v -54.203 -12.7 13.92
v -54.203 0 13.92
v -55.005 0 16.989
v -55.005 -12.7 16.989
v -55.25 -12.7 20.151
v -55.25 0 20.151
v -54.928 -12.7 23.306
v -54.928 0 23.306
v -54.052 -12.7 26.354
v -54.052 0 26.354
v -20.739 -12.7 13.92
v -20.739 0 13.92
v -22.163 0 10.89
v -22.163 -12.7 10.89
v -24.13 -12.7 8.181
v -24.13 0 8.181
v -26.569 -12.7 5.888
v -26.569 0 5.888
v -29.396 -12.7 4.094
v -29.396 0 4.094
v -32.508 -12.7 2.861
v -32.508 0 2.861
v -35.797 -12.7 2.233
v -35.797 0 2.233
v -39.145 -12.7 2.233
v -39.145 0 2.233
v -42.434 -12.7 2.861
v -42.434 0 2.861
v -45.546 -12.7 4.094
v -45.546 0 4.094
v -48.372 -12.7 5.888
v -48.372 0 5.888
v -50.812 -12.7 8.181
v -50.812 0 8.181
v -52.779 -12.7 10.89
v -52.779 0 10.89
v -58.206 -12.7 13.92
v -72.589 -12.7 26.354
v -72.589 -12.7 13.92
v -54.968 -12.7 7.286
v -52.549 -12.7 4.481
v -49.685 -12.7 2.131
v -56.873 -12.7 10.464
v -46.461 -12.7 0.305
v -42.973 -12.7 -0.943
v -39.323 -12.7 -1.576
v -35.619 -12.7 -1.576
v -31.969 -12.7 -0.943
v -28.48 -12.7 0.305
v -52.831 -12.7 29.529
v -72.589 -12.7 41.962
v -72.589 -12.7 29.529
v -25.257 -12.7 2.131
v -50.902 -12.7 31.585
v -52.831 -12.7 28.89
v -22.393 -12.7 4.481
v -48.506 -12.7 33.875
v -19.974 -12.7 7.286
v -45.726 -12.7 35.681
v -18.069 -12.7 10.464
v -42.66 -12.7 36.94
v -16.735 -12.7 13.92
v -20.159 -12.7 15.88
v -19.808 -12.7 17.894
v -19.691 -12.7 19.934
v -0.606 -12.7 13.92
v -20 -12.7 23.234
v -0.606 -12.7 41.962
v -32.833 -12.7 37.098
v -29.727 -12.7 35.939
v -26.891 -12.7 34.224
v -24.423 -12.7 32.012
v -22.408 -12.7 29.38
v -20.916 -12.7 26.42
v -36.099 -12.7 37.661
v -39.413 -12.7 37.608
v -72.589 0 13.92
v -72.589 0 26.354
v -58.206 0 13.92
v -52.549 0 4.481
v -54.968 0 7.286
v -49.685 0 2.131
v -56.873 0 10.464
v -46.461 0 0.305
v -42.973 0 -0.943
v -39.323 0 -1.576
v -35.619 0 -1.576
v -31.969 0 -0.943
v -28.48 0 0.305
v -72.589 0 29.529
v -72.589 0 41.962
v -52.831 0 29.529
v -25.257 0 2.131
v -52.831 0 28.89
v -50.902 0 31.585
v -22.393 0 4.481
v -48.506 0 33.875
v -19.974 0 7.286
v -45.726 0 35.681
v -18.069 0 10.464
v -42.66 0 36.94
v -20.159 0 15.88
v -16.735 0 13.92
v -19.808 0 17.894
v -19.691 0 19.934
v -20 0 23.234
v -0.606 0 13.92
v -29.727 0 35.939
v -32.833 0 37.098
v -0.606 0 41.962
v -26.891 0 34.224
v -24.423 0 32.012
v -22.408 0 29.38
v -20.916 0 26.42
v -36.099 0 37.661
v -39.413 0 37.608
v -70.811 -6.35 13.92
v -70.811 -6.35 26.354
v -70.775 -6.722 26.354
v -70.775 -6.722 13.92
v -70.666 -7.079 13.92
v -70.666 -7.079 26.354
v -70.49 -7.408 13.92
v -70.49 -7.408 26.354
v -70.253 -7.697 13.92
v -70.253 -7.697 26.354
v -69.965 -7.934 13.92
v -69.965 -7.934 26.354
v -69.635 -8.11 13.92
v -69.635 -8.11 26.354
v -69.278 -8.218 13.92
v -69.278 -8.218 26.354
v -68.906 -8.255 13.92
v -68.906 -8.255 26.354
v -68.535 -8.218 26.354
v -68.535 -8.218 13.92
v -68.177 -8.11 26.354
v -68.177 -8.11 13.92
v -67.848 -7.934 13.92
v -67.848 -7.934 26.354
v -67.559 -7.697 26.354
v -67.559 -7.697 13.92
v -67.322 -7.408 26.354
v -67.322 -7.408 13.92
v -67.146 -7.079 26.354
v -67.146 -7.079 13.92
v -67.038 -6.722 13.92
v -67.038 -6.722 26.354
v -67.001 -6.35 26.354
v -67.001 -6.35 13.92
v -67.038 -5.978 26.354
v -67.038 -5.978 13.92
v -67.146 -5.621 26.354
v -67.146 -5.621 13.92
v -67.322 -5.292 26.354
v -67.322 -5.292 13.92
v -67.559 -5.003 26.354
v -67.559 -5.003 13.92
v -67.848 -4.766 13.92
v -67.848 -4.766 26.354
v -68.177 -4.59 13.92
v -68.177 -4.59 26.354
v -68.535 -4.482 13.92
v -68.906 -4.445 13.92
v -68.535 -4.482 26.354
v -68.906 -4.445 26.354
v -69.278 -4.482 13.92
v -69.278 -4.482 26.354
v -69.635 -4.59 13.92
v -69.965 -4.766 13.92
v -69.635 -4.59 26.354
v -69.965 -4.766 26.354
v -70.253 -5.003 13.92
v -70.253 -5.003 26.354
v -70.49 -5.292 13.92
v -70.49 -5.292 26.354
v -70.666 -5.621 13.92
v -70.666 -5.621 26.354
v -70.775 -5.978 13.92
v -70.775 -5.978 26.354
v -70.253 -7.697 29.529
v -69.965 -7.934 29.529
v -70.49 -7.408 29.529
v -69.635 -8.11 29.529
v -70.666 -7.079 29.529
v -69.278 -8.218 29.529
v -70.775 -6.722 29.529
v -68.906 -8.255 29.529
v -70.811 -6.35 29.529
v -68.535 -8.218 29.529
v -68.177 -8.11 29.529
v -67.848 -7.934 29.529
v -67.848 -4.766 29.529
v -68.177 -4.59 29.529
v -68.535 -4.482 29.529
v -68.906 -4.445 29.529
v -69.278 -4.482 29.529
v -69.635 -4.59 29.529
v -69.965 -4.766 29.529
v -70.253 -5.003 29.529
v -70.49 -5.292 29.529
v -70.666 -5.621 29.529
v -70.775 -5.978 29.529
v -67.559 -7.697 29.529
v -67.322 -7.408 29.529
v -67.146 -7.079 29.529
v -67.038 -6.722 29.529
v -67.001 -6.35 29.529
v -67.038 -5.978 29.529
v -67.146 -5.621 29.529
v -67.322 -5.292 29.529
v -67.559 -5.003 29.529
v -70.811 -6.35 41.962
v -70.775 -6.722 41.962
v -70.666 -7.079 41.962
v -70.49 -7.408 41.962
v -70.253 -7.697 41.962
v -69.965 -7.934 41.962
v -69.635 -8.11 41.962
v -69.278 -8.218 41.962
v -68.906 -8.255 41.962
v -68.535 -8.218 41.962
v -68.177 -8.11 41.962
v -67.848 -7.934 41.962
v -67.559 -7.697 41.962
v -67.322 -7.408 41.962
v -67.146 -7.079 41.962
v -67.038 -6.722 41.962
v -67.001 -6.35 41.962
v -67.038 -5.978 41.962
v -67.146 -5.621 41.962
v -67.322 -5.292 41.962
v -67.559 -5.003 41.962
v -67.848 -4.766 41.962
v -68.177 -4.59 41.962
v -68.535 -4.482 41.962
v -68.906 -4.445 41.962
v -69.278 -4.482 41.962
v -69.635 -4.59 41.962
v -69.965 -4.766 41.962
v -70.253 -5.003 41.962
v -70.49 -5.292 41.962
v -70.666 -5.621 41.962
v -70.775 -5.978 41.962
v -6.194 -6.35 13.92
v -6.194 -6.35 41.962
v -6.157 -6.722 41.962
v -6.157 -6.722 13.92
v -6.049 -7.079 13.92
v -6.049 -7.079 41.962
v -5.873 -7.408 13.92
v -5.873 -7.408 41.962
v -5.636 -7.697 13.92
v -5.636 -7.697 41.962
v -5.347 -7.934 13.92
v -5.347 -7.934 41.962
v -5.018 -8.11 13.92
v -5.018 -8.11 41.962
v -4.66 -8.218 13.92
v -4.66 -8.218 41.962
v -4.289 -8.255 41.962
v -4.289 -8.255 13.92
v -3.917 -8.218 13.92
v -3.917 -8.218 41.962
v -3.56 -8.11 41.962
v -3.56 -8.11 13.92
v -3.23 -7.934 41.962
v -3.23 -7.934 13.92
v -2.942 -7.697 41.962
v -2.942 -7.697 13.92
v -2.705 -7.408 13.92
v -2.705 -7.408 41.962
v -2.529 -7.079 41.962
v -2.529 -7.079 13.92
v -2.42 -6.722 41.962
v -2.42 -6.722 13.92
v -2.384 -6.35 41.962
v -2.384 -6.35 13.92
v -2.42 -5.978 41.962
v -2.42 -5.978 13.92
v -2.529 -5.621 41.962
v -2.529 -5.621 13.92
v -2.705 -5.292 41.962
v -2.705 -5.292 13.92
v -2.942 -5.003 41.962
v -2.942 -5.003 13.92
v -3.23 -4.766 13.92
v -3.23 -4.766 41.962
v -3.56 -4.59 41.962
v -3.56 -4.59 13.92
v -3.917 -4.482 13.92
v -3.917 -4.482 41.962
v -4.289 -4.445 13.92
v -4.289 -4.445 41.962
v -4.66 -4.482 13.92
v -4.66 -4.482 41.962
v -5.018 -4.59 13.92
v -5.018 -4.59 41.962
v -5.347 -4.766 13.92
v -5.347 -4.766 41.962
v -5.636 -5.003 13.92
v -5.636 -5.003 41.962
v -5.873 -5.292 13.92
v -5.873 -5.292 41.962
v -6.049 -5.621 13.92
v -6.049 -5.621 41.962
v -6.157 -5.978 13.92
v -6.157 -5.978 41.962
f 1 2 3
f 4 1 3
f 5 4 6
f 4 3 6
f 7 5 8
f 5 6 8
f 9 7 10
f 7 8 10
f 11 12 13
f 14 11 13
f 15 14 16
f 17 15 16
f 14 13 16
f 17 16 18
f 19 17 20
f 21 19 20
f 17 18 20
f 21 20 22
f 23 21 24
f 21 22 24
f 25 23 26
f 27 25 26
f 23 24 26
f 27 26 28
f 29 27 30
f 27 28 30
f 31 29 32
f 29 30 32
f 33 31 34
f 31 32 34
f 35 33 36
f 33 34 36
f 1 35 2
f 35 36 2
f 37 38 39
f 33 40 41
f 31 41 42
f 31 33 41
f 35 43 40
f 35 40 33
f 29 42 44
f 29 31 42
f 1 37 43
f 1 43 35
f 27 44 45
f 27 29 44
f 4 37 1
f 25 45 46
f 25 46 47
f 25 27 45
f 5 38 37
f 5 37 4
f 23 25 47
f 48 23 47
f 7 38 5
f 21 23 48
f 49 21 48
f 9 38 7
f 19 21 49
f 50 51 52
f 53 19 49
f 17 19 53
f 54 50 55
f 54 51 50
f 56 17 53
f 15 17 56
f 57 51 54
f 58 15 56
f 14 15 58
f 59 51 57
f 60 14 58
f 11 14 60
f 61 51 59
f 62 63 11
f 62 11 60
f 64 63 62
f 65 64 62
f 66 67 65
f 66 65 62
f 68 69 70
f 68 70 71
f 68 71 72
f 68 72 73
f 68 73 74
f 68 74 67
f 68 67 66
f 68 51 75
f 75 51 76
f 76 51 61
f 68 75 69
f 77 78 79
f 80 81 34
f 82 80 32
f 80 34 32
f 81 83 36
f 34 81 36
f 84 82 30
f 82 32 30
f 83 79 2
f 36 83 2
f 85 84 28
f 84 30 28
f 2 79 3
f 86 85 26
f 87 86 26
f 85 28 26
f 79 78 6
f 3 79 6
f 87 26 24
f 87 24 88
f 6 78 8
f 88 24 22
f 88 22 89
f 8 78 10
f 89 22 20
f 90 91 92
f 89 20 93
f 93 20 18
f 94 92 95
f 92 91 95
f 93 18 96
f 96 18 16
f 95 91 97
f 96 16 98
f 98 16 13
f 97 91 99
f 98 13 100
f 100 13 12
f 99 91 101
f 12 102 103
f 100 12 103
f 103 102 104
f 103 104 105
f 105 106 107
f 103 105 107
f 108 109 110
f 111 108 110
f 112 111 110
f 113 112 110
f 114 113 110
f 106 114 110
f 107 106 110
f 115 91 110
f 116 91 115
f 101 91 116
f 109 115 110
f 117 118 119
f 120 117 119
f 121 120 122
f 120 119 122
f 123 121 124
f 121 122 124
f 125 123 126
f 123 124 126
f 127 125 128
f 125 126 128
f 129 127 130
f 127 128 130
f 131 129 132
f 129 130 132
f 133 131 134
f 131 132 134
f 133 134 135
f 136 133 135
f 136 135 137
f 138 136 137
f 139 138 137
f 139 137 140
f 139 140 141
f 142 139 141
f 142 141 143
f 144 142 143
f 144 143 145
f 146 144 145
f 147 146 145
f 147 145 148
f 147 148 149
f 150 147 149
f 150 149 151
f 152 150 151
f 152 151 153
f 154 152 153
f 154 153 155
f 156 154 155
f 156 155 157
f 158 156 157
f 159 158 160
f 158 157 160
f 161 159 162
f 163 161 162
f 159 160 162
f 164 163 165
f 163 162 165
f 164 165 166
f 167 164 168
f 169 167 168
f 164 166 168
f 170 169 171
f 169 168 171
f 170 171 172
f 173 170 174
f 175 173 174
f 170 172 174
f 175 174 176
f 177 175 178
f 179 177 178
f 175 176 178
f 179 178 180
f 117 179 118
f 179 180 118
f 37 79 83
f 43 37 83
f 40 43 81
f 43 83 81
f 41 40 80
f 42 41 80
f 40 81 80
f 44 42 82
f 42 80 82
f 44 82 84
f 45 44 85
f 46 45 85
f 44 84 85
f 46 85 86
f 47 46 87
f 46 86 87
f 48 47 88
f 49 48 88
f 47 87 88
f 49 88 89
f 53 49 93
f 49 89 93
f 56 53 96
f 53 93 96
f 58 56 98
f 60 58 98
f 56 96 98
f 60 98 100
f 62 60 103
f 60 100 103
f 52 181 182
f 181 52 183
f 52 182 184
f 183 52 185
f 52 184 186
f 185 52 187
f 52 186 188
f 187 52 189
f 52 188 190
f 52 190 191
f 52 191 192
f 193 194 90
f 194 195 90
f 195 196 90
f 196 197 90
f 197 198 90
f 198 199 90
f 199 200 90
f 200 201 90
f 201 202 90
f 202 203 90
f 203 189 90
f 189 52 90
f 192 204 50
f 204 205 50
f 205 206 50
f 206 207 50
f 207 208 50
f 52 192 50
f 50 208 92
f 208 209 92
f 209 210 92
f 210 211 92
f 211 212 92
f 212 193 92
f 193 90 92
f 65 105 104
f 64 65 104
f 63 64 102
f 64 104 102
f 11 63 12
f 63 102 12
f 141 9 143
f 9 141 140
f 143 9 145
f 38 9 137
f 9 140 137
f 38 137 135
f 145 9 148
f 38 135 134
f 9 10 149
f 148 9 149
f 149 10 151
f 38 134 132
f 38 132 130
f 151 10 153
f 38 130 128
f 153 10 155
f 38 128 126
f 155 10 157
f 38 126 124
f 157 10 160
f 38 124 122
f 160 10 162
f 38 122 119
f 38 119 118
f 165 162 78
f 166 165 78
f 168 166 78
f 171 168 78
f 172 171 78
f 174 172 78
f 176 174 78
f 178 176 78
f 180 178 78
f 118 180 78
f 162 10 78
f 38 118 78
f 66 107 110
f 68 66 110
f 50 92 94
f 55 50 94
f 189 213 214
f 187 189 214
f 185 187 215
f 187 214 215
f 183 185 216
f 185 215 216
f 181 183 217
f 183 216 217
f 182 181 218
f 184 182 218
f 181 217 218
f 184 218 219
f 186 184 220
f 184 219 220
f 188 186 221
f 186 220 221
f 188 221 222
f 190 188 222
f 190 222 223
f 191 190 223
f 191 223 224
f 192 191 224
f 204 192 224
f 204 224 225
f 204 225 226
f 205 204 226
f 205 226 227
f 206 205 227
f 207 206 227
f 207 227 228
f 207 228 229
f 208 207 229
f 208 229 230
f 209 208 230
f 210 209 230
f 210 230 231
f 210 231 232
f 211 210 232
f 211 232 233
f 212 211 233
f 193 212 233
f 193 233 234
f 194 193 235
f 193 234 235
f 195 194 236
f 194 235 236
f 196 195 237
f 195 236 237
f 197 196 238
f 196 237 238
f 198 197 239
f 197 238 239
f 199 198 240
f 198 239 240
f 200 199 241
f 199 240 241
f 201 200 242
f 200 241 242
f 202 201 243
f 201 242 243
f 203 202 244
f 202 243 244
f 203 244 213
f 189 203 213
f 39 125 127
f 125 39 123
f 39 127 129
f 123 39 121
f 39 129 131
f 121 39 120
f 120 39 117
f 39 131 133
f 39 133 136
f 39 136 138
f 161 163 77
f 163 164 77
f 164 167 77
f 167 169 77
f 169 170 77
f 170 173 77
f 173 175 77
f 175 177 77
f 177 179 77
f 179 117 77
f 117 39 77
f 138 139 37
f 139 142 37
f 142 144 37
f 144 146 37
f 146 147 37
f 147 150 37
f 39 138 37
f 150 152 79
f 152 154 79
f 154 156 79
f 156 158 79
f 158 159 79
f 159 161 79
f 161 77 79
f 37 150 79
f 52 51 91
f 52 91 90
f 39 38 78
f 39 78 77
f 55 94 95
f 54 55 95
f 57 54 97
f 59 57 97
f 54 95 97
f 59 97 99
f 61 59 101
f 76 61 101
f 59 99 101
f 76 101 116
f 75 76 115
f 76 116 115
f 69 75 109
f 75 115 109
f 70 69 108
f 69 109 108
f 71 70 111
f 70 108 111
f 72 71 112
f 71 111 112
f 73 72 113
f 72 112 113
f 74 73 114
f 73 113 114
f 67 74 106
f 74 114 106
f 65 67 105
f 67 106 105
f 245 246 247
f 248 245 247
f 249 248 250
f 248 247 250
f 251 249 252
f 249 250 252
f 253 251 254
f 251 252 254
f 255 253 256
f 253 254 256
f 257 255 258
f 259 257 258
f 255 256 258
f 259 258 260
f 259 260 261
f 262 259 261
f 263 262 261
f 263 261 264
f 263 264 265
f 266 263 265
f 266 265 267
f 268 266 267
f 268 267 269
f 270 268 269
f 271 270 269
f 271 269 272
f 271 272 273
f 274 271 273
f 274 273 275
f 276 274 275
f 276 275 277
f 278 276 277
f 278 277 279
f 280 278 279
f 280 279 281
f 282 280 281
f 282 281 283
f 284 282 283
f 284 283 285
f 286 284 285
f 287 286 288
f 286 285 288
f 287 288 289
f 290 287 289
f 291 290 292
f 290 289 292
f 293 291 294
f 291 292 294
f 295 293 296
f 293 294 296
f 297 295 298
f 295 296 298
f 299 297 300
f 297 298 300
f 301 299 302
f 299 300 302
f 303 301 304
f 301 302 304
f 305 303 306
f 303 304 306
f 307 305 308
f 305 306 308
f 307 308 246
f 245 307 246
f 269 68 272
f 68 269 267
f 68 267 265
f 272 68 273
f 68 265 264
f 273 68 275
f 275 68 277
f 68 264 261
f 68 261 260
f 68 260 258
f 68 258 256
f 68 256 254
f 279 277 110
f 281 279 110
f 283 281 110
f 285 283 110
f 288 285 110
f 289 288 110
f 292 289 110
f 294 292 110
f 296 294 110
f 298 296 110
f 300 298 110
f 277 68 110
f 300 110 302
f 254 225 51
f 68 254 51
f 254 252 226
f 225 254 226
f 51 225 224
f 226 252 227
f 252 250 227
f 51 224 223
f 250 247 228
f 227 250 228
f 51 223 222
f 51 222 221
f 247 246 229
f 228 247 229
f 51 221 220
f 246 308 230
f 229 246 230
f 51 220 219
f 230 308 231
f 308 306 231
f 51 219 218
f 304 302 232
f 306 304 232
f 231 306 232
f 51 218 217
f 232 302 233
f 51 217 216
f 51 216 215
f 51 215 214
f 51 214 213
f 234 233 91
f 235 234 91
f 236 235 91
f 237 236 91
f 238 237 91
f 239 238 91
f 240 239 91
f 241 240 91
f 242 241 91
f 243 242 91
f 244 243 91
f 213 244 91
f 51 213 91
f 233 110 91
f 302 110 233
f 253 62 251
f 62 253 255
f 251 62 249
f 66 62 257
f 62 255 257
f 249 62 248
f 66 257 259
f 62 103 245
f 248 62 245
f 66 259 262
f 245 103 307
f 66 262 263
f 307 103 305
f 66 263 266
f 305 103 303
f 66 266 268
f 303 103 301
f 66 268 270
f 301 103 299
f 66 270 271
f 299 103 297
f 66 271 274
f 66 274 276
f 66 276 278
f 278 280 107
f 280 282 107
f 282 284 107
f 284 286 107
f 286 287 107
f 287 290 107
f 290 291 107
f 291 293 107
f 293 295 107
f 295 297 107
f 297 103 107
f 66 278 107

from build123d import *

# Parameters (mm, degrees)
F1_DEPTH = 12.7
F3_D     = 3.81


# Not quite as in the source:
# - a feature names something its author has since deleted; it is built from what else it names


with BuildPart() as f1:
    # F0 (on Front) → F1 (new body)
    with BuildSketch(Plane.XZ):
        with BuildLine():
            Line((-0.6058157035, 13.9202102855), (-0.6058157035, 41.9618102855))
            Line((-0.6058157035, 41.9618102855), (-2.6976561639, 41.9618102855))
            Line((-2.6976561639, 41.9618102855), (-72.5894157035, 41.9618102855))
            Line((-72.5894157035, 41.9618102855), (-72.5894157035, 29.5285102855))
            Line((-72.5894157035, 29.5285102855), (-59.4971985196, 29.5285102855))
            Line((-59.4971985196, 29.5285102855), (-56.8120155754, 29.5285102855))
            ThreePointArc((-56.8120155754, 29.5285102855), (-32.5437541307, 40.9543939264), (-15.88096278, 19.934148568))
            ThreePointArc((-15.88096278, 19.934148568), (-16.0956571498, 16.8969773161), (-16.7354703496, 13.9202102855))
            Line((-16.7354703496, 13.9202102855), (-0.6058157035, 13.9202102855))
        make_face()
        with BuildLine():
            Line((-72.5894157035, 13.9202102855), (-58.2064552105, 13.9202102855))
            ThreePointArc((-58.2064552105, 13.9202102855), (-59.0599250667, 20.1458261131), (-58.0845479883, 26.3535102855))
            Line((-58.0845479883, 26.3535102855), (-59.4971985196, 26.3535102855))
            Line((-59.4971985196, 26.3535102855), (-72.5894157035, 26.3535102855))
            Line((-72.5894157035, 26.3535102855), (-72.5894157035, 13.9202102855))
        make_face()
        with BuildLine():
            Line((-20.7389292415, 13.9202102855), (-16.7354703496, 13.9202102855))
            ThreePointArc((-16.7354703496, 13.9202102855), (-16.0956571498, 16.8969773161), (-15.88096278, 19.934148568))
            ThreePointArc((-15.88096278, 19.934148568), (-32.5437541307, 40.9543939264), (-56.8120155754, 29.5285102855))
            Line((-56.8120155754, 29.5285102855), (-52.8308911926, 29.5285102855))
            Line((-52.8308911926, 29.5285102855), (-52.8308911926, 28.8896496238))
            ThreePointArc((-52.8308911926, 28.8896496238), (-32.8325970751, 37.098470972), (-19.69096278, 19.934148568))
            ThreePointArc((-19.69096278, 19.934148568), (-19.9549136205, 16.881867152), (-20.7389292415, 13.9202102855))
        make_face()
        with BuildLine():
            ThreePointArc((-58.2064552105, 13.9202102855), (-37.47096278, -1.655851432), (-16.7354703496, 13.9202102855))
            Line((-16.7354703496, 13.9202102855), (-20.7389292415, 13.9202102855))
            ThreePointArc((-20.7389292415, 13.9202102855), (-37.47096278, 2.154148568), (-54.2029963185, 13.9202102855))
            Line((-54.2029963185, 13.9202102855), (-58.2064552105, 13.9202102855))
        make_face()
        with BuildLine():
            ThreePointArc((-58.0845479883, 26.3535102855), (-59.0599250667, 20.1458261131), (-58.2064552105, 13.9202102855))
            Line((-58.2064552105, 13.9202102855), (-54.2029963185, 13.9202102855))
            ThreePointArc((-54.2029963185, 13.9202102855), (-55.249646191, 20.1505190165), (-54.0516803501, 26.3535102855))
            Line((-54.0516803501, 26.3535102855), (-58.0845479883, 26.3535102855))
        make_face()
    extrude(amount=F1_DEPTH)

    # F3 (through all)
    with Locations(Plane(origin=(0, 0, 0), x_dir=(1, 0, 0), z_dir=(0, 0, -1))):
        with Locations((-68.9064157035, 6.35), (-4.2888157035, 6.35)):
            Hole(F3_D / 2)


solid = f1.part
